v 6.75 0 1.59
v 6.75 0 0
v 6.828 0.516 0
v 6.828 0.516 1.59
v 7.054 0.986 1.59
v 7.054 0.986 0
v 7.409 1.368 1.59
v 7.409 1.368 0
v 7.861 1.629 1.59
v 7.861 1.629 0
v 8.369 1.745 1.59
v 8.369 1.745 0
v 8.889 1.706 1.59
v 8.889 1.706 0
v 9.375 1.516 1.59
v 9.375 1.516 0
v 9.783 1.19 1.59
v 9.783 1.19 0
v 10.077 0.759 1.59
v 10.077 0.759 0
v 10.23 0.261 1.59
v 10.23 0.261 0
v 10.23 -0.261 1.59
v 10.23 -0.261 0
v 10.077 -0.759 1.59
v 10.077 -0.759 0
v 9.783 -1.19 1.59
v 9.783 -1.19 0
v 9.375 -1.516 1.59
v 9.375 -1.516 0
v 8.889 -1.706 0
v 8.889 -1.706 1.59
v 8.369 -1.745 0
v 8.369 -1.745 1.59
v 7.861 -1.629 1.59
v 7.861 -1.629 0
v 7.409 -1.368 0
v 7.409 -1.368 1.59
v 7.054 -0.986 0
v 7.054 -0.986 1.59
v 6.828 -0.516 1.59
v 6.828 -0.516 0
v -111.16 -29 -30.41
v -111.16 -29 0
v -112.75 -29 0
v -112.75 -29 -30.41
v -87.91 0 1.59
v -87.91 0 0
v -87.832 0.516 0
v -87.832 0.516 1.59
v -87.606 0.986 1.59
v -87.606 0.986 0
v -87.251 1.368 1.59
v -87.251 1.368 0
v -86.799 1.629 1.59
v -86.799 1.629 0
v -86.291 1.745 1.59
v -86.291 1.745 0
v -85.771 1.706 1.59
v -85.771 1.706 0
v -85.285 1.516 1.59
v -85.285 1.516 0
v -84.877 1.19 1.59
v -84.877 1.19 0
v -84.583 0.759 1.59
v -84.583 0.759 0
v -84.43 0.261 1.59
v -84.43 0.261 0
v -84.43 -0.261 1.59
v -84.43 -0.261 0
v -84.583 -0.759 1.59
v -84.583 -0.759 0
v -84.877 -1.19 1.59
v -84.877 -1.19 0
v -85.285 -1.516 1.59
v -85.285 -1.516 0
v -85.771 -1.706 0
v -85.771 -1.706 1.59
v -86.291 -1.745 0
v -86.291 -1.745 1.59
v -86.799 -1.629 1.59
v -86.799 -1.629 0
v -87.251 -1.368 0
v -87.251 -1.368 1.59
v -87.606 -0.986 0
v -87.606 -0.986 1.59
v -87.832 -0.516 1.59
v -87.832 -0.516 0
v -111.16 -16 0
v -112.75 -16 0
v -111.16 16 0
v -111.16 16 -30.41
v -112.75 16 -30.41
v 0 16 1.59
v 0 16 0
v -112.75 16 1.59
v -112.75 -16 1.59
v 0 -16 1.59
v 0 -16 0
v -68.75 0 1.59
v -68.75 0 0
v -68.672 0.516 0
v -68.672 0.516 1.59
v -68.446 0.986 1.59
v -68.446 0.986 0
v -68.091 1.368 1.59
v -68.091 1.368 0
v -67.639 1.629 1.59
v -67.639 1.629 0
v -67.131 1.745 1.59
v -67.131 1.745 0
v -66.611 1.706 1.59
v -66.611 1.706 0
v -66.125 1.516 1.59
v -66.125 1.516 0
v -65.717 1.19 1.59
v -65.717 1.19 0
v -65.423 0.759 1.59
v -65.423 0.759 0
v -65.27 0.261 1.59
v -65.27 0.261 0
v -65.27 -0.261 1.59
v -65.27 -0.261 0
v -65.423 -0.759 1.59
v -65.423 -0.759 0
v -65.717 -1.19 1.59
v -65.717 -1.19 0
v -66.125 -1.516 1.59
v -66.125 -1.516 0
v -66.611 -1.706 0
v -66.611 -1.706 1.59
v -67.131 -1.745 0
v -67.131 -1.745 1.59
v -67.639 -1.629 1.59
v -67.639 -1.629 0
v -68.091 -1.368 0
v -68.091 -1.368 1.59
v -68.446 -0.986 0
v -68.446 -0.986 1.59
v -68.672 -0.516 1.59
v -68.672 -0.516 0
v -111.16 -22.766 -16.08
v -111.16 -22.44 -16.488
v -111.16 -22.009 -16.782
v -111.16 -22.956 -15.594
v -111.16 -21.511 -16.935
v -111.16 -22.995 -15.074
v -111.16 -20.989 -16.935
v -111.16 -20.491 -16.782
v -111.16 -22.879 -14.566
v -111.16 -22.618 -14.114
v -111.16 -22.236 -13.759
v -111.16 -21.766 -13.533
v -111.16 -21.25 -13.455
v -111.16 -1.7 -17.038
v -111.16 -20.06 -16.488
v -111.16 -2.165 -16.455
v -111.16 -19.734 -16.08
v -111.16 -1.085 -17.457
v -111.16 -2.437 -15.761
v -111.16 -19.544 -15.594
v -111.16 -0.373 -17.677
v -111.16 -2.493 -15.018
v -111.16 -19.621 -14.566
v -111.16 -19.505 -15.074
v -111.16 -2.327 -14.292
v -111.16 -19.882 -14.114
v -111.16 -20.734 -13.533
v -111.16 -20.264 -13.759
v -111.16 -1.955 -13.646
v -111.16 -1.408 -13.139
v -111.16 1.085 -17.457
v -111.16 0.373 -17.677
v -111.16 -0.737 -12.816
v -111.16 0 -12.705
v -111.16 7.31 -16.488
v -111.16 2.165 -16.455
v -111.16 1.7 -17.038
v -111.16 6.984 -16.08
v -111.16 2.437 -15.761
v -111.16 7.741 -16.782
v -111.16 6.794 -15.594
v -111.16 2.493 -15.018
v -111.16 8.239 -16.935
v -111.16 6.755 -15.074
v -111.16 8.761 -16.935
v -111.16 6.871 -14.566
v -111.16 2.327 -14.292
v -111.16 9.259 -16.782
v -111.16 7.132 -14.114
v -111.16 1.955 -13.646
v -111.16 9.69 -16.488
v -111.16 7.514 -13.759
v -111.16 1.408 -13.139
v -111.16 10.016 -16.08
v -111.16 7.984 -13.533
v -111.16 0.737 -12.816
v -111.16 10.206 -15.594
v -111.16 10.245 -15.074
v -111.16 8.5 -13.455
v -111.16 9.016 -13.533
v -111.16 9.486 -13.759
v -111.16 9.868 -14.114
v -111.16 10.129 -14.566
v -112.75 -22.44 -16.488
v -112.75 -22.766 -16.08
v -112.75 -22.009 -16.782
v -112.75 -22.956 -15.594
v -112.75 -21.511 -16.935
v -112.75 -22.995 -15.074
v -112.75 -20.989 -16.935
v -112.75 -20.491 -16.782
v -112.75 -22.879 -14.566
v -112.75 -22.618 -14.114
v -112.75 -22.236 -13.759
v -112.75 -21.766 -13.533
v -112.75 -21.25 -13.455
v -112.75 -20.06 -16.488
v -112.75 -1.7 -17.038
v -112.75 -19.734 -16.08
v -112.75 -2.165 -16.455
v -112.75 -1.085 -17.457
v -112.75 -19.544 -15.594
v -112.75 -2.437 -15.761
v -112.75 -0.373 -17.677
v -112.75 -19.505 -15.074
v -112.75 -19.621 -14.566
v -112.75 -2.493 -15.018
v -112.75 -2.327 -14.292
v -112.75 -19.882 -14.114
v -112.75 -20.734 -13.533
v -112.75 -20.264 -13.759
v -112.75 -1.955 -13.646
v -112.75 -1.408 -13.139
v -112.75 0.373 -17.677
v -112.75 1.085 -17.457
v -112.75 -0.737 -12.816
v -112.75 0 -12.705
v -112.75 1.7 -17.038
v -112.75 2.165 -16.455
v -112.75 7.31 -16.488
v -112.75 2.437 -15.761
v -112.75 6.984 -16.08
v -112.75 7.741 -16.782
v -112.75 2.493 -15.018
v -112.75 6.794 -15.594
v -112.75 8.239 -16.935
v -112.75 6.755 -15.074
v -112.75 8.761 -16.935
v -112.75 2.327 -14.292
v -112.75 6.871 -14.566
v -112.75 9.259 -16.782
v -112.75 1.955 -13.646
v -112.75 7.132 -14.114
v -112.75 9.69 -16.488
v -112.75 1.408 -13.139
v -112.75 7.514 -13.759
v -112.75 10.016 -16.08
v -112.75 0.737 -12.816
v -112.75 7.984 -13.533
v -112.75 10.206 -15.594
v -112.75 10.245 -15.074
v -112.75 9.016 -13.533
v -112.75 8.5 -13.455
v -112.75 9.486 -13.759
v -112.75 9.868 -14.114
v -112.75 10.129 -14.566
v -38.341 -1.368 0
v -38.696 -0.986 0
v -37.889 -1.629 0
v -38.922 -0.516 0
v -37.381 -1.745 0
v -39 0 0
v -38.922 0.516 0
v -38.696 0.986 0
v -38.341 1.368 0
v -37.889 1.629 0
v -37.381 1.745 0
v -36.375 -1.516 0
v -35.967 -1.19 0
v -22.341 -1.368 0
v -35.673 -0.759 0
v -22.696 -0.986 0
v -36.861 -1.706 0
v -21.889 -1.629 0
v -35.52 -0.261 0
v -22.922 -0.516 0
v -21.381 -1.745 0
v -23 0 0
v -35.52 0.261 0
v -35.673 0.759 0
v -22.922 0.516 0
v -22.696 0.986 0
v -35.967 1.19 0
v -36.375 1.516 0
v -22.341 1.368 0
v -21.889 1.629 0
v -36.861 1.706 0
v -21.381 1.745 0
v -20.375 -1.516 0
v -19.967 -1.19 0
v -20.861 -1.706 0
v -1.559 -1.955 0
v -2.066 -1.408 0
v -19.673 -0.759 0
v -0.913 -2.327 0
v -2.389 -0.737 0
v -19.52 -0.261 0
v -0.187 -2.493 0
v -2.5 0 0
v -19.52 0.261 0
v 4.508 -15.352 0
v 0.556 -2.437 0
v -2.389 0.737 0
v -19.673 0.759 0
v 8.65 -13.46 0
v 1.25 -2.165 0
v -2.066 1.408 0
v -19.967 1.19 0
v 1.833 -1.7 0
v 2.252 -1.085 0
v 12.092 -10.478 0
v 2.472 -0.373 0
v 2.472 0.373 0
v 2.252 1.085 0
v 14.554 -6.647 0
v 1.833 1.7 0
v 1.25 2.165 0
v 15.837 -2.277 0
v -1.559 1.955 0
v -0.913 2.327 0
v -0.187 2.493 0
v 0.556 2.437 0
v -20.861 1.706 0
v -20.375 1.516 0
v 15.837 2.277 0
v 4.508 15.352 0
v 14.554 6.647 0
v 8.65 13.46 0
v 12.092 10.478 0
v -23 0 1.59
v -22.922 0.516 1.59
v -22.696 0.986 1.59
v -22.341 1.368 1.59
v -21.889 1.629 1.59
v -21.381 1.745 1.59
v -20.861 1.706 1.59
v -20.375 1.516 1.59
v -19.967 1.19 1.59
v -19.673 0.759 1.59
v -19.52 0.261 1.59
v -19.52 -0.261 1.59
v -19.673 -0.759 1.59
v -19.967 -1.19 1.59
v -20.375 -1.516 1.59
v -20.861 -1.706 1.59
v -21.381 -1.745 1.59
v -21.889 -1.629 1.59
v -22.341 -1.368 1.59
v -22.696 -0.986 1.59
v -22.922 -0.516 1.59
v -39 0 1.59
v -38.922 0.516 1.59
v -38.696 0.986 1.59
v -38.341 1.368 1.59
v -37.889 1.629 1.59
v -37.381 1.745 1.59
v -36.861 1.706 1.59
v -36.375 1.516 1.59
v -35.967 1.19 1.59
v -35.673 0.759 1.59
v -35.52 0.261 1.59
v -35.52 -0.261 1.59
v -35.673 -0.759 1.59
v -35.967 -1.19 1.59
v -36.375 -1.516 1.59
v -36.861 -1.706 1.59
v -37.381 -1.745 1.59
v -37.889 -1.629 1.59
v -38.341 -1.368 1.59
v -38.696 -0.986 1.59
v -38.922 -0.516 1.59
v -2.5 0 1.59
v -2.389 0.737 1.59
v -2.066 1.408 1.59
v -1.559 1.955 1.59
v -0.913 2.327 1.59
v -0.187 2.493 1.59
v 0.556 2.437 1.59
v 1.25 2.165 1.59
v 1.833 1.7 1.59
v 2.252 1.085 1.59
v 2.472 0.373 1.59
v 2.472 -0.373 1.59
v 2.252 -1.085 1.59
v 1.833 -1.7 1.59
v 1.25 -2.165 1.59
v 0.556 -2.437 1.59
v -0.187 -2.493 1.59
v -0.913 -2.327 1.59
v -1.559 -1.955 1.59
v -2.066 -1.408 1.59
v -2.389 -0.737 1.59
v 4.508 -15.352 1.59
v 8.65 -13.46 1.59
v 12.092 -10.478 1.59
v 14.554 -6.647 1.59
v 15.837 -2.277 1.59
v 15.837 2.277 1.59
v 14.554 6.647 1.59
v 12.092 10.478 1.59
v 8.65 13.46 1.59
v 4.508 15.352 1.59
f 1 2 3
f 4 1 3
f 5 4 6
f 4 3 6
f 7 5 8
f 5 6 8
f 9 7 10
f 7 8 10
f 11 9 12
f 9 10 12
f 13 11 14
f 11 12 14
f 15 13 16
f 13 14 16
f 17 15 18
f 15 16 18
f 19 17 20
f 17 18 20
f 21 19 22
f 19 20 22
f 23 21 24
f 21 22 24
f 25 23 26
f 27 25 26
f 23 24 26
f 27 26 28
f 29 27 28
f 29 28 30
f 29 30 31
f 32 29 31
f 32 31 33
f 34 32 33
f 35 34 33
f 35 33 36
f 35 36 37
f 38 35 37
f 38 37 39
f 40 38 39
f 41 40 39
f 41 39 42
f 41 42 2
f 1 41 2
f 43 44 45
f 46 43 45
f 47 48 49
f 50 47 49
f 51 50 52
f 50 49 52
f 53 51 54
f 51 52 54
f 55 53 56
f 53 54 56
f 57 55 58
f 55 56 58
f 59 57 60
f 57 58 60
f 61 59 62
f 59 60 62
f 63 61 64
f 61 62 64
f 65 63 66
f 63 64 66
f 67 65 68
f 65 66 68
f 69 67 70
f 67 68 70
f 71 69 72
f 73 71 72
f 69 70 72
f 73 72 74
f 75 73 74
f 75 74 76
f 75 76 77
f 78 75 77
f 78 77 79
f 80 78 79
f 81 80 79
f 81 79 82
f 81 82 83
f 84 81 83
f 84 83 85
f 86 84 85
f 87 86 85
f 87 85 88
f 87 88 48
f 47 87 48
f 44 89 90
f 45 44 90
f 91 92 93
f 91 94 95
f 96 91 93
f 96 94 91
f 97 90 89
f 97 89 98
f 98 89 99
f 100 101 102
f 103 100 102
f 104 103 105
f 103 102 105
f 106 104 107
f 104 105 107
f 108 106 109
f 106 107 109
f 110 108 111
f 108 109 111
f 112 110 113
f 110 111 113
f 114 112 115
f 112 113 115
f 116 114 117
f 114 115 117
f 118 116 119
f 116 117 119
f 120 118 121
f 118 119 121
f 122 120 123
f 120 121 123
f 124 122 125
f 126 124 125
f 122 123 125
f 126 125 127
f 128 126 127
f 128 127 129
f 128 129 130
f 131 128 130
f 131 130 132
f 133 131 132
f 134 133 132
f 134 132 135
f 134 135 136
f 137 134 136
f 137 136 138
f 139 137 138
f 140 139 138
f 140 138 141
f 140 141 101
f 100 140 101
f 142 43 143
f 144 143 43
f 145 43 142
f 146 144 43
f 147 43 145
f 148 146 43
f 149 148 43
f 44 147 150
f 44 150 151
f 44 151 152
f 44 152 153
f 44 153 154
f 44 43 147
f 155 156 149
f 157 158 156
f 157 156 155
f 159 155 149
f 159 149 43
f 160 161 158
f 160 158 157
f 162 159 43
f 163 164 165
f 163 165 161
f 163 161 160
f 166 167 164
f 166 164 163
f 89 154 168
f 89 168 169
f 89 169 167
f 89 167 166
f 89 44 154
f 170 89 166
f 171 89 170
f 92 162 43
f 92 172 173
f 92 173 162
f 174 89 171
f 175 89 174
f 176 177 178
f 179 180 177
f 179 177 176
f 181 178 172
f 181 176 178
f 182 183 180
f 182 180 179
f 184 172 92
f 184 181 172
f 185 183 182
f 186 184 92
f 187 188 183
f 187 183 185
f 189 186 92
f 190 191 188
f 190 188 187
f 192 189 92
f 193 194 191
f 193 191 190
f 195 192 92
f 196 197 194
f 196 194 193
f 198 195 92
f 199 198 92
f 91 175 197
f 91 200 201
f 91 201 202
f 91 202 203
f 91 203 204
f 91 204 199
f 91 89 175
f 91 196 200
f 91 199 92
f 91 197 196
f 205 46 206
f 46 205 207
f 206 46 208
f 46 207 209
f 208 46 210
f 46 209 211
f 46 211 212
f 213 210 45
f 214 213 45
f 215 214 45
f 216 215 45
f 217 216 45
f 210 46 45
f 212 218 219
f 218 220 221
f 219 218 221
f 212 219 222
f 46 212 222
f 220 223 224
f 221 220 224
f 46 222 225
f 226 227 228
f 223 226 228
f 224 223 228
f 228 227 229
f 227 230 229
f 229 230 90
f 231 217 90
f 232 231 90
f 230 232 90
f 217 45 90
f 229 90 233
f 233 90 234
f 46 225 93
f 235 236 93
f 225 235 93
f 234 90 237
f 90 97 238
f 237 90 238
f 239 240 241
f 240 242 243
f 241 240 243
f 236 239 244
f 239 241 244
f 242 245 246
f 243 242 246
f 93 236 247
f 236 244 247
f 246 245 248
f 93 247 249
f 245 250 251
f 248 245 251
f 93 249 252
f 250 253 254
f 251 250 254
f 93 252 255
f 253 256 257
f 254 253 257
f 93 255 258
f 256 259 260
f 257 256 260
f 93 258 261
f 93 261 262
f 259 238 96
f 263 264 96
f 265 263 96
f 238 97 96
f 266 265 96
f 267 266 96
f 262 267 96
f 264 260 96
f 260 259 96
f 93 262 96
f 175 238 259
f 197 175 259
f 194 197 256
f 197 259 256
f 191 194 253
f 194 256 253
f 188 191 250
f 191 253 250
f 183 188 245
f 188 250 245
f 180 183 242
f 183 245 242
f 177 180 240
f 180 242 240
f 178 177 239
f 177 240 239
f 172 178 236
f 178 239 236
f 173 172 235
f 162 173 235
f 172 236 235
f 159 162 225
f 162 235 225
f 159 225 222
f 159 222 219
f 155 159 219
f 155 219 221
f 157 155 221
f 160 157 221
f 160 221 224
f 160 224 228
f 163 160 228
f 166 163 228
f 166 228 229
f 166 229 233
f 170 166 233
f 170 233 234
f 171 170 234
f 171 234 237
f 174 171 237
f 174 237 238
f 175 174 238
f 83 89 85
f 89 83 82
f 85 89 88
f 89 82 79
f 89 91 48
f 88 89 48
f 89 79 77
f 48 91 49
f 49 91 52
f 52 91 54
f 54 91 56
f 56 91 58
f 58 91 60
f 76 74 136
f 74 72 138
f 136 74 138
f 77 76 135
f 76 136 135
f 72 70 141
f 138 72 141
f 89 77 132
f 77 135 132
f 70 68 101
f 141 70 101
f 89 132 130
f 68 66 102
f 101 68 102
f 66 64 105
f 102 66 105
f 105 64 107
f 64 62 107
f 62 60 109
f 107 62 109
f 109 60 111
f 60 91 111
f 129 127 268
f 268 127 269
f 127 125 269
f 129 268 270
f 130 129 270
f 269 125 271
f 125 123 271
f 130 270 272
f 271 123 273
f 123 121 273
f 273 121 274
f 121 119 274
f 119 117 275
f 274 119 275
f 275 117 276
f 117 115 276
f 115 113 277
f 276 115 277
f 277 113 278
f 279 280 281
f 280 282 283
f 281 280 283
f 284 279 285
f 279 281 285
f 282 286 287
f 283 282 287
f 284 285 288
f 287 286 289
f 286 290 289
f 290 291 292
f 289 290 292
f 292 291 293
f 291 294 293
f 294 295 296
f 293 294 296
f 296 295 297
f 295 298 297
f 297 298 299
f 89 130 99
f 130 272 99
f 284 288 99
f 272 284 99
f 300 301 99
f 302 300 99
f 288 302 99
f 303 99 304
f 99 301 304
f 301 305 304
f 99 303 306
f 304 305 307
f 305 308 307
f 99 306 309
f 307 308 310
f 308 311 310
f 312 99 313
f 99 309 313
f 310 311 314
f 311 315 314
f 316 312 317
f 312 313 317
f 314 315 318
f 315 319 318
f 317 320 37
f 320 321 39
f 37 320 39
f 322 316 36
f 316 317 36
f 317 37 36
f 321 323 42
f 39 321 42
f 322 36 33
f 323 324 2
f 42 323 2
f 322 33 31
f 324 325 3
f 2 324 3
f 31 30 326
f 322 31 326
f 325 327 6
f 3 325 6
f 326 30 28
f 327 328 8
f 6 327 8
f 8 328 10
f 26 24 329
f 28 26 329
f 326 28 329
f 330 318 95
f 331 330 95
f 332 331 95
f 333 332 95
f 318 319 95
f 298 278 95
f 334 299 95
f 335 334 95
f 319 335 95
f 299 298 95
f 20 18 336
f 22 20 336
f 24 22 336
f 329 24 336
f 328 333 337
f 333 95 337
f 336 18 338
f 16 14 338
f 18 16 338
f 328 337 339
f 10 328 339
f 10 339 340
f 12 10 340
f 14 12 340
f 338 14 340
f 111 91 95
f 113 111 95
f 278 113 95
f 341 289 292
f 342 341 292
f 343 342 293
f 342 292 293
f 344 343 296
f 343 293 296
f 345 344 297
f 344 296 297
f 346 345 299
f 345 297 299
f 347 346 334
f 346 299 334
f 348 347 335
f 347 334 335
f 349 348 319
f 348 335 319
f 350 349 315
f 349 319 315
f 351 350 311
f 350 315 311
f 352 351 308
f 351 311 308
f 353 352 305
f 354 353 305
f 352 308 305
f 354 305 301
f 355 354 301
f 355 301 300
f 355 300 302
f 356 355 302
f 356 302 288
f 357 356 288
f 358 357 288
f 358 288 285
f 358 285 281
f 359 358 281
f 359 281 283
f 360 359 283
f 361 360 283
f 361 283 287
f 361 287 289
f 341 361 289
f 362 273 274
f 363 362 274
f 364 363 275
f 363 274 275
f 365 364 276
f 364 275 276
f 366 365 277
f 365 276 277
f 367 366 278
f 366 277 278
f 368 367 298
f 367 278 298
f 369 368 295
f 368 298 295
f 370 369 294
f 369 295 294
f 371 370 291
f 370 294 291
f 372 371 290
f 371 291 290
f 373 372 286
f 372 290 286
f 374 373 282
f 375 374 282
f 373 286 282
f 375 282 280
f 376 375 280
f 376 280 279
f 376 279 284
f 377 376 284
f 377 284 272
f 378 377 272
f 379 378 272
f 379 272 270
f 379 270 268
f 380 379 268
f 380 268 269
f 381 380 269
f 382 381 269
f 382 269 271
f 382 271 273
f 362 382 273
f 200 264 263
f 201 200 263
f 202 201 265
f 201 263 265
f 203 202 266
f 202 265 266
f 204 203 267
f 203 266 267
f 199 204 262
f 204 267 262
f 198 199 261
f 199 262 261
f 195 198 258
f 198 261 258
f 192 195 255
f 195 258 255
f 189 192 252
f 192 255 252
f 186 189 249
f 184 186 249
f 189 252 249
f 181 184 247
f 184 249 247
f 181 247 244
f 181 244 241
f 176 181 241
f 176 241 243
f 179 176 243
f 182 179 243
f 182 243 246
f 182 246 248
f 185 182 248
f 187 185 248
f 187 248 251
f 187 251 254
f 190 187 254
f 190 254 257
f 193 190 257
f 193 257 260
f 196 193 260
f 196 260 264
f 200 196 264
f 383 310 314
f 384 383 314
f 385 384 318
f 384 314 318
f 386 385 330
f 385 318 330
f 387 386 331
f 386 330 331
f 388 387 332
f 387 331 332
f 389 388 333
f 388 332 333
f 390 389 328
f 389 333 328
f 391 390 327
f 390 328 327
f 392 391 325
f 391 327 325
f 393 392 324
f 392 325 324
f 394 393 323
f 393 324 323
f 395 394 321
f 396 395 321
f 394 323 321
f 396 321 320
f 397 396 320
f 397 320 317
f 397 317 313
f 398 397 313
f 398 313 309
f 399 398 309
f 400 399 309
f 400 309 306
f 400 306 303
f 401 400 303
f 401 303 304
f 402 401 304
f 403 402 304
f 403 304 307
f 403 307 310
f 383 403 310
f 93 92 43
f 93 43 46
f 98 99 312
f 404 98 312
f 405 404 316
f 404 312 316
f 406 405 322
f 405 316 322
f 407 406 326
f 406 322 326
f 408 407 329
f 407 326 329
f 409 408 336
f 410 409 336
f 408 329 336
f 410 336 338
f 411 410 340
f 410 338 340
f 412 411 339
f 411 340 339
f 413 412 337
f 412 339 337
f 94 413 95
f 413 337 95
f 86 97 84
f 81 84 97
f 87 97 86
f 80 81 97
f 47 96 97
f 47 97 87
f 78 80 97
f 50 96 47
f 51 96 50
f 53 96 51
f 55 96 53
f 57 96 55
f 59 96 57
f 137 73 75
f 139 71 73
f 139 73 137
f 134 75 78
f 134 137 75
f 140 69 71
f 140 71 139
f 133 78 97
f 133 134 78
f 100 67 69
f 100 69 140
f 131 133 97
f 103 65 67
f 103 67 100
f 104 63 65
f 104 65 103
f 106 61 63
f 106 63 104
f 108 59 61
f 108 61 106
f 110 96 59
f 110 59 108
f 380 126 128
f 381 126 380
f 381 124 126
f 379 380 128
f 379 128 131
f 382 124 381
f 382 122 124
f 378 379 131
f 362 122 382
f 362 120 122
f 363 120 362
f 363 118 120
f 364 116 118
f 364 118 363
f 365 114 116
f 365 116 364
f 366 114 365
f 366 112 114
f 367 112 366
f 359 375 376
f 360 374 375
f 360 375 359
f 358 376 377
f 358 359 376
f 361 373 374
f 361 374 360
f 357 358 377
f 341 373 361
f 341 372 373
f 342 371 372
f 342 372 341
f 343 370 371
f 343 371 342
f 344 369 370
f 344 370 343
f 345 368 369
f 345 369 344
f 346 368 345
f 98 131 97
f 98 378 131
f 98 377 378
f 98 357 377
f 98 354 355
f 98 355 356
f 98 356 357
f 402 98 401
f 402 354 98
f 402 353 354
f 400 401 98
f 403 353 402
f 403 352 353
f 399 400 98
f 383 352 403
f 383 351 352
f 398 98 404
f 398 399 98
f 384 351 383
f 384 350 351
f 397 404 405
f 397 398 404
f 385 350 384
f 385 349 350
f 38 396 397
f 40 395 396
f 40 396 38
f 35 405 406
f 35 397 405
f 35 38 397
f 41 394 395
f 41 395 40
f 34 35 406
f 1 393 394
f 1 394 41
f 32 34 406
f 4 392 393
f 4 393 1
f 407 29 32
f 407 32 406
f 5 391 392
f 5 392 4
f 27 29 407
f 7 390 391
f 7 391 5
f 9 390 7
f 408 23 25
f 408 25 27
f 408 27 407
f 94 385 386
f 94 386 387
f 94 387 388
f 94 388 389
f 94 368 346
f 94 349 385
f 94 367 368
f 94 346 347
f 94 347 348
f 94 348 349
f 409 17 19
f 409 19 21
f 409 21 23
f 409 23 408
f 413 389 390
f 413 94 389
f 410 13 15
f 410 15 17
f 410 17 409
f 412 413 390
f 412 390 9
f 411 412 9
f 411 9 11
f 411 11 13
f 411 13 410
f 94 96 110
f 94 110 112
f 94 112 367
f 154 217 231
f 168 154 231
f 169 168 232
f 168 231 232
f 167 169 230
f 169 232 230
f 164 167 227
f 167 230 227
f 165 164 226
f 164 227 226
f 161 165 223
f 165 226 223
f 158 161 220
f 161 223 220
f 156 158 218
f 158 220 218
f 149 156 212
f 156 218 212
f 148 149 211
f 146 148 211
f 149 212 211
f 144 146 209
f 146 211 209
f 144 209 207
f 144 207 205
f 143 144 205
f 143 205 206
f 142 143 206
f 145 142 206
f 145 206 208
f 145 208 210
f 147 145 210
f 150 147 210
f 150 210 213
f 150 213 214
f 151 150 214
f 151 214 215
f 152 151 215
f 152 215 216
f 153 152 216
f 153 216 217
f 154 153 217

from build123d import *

# Parameters (mm, degrees)
BOSS_EXTRUDE1_DEPTH = 1.59
SKETCH2_W           = 1.59
SKETCH2_H           = 45
BOSS_EXTRUDE2_DEPTH = 30.41
SKETCH3_R           = 1.75
SKETCH3_R_2         = 2.5
CUT_EXTRUDE1_DEPTH  = 121.32593486
SKETCH4_R           = 2.5
SKETCH4_R_2         = 1.75
CUT_EXTRUDE2_DEPTH  = 30.41


with BuildPart() as part:
    # Sketch1 → Boss-Extrude1 (new body)
    with BuildSketch(Plane.XY):
        with BuildLine():
            Line((0, 16), (-112.75, 16))
            Line((-112.75, 16), (-112.75, -16))
            Line((-112.75, -16), (0, -16))
            ThreePointArc((0, -16), (16, 0), (0, 16))
        make_face()
    extrude(amount=BOSS_EXTRUDE1_DEPTH)

    # Sketch2 → Boss-Extrude2 (add)
    with BuildSketch(Plane(origin=(0, 0, 0), x_dir=(-1, 0, 0), z_dir=(0, 0, -1))):
        with Locations((111.955, -6.5)):
            Rectangle(SKETCH2_W, SKETCH2_H)
    extrude(amount=BOSS_EXTRUDE2_DEPTH)

    # Sketch3 → Cut-Extrude1 (cut, through all)
    with BuildSketch(Plane(origin=(0, 0, 0), x_dir=(-1, 0, 0), z_dir=(0, 0, -1))):
        with Locations((86.16, 0)):
            Circle(SKETCH3_R)
        with Locations((37.25, 0)):
            Circle(SKETCH3_R)
        with Locations((67, 0)):
            Circle(SKETCH3_R)
        with Locations((-8.5, 0)):
            Circle(SKETCH3_R)
        Circle(SKETCH3_R_2)
        with Locations((21.25, 0)):
            Circle(SKETCH3_R)
    extrude(amount=-CUT_EXTRUDE1_DEPTH, mode=Mode.SUBTRACT)

    # Sketch4 → Cut-Extrude2 (cut)
    with BuildSketch(Plane.ZY.offset(112.75)):
        with Locations((-15.205, 0)):
            Circle(SKETCH4_R)
        with Locations((-15.205, 8.5)):
            Circle(SKETCH4_R_2)
        with Locations((-15.205, -21.25)):
            Circle(SKETCH4_R_2)
    extrude(amount=-CUT_EXTRUDE2_DEPTH, mode=Mode.SUBTRACT)


solid = part.part
